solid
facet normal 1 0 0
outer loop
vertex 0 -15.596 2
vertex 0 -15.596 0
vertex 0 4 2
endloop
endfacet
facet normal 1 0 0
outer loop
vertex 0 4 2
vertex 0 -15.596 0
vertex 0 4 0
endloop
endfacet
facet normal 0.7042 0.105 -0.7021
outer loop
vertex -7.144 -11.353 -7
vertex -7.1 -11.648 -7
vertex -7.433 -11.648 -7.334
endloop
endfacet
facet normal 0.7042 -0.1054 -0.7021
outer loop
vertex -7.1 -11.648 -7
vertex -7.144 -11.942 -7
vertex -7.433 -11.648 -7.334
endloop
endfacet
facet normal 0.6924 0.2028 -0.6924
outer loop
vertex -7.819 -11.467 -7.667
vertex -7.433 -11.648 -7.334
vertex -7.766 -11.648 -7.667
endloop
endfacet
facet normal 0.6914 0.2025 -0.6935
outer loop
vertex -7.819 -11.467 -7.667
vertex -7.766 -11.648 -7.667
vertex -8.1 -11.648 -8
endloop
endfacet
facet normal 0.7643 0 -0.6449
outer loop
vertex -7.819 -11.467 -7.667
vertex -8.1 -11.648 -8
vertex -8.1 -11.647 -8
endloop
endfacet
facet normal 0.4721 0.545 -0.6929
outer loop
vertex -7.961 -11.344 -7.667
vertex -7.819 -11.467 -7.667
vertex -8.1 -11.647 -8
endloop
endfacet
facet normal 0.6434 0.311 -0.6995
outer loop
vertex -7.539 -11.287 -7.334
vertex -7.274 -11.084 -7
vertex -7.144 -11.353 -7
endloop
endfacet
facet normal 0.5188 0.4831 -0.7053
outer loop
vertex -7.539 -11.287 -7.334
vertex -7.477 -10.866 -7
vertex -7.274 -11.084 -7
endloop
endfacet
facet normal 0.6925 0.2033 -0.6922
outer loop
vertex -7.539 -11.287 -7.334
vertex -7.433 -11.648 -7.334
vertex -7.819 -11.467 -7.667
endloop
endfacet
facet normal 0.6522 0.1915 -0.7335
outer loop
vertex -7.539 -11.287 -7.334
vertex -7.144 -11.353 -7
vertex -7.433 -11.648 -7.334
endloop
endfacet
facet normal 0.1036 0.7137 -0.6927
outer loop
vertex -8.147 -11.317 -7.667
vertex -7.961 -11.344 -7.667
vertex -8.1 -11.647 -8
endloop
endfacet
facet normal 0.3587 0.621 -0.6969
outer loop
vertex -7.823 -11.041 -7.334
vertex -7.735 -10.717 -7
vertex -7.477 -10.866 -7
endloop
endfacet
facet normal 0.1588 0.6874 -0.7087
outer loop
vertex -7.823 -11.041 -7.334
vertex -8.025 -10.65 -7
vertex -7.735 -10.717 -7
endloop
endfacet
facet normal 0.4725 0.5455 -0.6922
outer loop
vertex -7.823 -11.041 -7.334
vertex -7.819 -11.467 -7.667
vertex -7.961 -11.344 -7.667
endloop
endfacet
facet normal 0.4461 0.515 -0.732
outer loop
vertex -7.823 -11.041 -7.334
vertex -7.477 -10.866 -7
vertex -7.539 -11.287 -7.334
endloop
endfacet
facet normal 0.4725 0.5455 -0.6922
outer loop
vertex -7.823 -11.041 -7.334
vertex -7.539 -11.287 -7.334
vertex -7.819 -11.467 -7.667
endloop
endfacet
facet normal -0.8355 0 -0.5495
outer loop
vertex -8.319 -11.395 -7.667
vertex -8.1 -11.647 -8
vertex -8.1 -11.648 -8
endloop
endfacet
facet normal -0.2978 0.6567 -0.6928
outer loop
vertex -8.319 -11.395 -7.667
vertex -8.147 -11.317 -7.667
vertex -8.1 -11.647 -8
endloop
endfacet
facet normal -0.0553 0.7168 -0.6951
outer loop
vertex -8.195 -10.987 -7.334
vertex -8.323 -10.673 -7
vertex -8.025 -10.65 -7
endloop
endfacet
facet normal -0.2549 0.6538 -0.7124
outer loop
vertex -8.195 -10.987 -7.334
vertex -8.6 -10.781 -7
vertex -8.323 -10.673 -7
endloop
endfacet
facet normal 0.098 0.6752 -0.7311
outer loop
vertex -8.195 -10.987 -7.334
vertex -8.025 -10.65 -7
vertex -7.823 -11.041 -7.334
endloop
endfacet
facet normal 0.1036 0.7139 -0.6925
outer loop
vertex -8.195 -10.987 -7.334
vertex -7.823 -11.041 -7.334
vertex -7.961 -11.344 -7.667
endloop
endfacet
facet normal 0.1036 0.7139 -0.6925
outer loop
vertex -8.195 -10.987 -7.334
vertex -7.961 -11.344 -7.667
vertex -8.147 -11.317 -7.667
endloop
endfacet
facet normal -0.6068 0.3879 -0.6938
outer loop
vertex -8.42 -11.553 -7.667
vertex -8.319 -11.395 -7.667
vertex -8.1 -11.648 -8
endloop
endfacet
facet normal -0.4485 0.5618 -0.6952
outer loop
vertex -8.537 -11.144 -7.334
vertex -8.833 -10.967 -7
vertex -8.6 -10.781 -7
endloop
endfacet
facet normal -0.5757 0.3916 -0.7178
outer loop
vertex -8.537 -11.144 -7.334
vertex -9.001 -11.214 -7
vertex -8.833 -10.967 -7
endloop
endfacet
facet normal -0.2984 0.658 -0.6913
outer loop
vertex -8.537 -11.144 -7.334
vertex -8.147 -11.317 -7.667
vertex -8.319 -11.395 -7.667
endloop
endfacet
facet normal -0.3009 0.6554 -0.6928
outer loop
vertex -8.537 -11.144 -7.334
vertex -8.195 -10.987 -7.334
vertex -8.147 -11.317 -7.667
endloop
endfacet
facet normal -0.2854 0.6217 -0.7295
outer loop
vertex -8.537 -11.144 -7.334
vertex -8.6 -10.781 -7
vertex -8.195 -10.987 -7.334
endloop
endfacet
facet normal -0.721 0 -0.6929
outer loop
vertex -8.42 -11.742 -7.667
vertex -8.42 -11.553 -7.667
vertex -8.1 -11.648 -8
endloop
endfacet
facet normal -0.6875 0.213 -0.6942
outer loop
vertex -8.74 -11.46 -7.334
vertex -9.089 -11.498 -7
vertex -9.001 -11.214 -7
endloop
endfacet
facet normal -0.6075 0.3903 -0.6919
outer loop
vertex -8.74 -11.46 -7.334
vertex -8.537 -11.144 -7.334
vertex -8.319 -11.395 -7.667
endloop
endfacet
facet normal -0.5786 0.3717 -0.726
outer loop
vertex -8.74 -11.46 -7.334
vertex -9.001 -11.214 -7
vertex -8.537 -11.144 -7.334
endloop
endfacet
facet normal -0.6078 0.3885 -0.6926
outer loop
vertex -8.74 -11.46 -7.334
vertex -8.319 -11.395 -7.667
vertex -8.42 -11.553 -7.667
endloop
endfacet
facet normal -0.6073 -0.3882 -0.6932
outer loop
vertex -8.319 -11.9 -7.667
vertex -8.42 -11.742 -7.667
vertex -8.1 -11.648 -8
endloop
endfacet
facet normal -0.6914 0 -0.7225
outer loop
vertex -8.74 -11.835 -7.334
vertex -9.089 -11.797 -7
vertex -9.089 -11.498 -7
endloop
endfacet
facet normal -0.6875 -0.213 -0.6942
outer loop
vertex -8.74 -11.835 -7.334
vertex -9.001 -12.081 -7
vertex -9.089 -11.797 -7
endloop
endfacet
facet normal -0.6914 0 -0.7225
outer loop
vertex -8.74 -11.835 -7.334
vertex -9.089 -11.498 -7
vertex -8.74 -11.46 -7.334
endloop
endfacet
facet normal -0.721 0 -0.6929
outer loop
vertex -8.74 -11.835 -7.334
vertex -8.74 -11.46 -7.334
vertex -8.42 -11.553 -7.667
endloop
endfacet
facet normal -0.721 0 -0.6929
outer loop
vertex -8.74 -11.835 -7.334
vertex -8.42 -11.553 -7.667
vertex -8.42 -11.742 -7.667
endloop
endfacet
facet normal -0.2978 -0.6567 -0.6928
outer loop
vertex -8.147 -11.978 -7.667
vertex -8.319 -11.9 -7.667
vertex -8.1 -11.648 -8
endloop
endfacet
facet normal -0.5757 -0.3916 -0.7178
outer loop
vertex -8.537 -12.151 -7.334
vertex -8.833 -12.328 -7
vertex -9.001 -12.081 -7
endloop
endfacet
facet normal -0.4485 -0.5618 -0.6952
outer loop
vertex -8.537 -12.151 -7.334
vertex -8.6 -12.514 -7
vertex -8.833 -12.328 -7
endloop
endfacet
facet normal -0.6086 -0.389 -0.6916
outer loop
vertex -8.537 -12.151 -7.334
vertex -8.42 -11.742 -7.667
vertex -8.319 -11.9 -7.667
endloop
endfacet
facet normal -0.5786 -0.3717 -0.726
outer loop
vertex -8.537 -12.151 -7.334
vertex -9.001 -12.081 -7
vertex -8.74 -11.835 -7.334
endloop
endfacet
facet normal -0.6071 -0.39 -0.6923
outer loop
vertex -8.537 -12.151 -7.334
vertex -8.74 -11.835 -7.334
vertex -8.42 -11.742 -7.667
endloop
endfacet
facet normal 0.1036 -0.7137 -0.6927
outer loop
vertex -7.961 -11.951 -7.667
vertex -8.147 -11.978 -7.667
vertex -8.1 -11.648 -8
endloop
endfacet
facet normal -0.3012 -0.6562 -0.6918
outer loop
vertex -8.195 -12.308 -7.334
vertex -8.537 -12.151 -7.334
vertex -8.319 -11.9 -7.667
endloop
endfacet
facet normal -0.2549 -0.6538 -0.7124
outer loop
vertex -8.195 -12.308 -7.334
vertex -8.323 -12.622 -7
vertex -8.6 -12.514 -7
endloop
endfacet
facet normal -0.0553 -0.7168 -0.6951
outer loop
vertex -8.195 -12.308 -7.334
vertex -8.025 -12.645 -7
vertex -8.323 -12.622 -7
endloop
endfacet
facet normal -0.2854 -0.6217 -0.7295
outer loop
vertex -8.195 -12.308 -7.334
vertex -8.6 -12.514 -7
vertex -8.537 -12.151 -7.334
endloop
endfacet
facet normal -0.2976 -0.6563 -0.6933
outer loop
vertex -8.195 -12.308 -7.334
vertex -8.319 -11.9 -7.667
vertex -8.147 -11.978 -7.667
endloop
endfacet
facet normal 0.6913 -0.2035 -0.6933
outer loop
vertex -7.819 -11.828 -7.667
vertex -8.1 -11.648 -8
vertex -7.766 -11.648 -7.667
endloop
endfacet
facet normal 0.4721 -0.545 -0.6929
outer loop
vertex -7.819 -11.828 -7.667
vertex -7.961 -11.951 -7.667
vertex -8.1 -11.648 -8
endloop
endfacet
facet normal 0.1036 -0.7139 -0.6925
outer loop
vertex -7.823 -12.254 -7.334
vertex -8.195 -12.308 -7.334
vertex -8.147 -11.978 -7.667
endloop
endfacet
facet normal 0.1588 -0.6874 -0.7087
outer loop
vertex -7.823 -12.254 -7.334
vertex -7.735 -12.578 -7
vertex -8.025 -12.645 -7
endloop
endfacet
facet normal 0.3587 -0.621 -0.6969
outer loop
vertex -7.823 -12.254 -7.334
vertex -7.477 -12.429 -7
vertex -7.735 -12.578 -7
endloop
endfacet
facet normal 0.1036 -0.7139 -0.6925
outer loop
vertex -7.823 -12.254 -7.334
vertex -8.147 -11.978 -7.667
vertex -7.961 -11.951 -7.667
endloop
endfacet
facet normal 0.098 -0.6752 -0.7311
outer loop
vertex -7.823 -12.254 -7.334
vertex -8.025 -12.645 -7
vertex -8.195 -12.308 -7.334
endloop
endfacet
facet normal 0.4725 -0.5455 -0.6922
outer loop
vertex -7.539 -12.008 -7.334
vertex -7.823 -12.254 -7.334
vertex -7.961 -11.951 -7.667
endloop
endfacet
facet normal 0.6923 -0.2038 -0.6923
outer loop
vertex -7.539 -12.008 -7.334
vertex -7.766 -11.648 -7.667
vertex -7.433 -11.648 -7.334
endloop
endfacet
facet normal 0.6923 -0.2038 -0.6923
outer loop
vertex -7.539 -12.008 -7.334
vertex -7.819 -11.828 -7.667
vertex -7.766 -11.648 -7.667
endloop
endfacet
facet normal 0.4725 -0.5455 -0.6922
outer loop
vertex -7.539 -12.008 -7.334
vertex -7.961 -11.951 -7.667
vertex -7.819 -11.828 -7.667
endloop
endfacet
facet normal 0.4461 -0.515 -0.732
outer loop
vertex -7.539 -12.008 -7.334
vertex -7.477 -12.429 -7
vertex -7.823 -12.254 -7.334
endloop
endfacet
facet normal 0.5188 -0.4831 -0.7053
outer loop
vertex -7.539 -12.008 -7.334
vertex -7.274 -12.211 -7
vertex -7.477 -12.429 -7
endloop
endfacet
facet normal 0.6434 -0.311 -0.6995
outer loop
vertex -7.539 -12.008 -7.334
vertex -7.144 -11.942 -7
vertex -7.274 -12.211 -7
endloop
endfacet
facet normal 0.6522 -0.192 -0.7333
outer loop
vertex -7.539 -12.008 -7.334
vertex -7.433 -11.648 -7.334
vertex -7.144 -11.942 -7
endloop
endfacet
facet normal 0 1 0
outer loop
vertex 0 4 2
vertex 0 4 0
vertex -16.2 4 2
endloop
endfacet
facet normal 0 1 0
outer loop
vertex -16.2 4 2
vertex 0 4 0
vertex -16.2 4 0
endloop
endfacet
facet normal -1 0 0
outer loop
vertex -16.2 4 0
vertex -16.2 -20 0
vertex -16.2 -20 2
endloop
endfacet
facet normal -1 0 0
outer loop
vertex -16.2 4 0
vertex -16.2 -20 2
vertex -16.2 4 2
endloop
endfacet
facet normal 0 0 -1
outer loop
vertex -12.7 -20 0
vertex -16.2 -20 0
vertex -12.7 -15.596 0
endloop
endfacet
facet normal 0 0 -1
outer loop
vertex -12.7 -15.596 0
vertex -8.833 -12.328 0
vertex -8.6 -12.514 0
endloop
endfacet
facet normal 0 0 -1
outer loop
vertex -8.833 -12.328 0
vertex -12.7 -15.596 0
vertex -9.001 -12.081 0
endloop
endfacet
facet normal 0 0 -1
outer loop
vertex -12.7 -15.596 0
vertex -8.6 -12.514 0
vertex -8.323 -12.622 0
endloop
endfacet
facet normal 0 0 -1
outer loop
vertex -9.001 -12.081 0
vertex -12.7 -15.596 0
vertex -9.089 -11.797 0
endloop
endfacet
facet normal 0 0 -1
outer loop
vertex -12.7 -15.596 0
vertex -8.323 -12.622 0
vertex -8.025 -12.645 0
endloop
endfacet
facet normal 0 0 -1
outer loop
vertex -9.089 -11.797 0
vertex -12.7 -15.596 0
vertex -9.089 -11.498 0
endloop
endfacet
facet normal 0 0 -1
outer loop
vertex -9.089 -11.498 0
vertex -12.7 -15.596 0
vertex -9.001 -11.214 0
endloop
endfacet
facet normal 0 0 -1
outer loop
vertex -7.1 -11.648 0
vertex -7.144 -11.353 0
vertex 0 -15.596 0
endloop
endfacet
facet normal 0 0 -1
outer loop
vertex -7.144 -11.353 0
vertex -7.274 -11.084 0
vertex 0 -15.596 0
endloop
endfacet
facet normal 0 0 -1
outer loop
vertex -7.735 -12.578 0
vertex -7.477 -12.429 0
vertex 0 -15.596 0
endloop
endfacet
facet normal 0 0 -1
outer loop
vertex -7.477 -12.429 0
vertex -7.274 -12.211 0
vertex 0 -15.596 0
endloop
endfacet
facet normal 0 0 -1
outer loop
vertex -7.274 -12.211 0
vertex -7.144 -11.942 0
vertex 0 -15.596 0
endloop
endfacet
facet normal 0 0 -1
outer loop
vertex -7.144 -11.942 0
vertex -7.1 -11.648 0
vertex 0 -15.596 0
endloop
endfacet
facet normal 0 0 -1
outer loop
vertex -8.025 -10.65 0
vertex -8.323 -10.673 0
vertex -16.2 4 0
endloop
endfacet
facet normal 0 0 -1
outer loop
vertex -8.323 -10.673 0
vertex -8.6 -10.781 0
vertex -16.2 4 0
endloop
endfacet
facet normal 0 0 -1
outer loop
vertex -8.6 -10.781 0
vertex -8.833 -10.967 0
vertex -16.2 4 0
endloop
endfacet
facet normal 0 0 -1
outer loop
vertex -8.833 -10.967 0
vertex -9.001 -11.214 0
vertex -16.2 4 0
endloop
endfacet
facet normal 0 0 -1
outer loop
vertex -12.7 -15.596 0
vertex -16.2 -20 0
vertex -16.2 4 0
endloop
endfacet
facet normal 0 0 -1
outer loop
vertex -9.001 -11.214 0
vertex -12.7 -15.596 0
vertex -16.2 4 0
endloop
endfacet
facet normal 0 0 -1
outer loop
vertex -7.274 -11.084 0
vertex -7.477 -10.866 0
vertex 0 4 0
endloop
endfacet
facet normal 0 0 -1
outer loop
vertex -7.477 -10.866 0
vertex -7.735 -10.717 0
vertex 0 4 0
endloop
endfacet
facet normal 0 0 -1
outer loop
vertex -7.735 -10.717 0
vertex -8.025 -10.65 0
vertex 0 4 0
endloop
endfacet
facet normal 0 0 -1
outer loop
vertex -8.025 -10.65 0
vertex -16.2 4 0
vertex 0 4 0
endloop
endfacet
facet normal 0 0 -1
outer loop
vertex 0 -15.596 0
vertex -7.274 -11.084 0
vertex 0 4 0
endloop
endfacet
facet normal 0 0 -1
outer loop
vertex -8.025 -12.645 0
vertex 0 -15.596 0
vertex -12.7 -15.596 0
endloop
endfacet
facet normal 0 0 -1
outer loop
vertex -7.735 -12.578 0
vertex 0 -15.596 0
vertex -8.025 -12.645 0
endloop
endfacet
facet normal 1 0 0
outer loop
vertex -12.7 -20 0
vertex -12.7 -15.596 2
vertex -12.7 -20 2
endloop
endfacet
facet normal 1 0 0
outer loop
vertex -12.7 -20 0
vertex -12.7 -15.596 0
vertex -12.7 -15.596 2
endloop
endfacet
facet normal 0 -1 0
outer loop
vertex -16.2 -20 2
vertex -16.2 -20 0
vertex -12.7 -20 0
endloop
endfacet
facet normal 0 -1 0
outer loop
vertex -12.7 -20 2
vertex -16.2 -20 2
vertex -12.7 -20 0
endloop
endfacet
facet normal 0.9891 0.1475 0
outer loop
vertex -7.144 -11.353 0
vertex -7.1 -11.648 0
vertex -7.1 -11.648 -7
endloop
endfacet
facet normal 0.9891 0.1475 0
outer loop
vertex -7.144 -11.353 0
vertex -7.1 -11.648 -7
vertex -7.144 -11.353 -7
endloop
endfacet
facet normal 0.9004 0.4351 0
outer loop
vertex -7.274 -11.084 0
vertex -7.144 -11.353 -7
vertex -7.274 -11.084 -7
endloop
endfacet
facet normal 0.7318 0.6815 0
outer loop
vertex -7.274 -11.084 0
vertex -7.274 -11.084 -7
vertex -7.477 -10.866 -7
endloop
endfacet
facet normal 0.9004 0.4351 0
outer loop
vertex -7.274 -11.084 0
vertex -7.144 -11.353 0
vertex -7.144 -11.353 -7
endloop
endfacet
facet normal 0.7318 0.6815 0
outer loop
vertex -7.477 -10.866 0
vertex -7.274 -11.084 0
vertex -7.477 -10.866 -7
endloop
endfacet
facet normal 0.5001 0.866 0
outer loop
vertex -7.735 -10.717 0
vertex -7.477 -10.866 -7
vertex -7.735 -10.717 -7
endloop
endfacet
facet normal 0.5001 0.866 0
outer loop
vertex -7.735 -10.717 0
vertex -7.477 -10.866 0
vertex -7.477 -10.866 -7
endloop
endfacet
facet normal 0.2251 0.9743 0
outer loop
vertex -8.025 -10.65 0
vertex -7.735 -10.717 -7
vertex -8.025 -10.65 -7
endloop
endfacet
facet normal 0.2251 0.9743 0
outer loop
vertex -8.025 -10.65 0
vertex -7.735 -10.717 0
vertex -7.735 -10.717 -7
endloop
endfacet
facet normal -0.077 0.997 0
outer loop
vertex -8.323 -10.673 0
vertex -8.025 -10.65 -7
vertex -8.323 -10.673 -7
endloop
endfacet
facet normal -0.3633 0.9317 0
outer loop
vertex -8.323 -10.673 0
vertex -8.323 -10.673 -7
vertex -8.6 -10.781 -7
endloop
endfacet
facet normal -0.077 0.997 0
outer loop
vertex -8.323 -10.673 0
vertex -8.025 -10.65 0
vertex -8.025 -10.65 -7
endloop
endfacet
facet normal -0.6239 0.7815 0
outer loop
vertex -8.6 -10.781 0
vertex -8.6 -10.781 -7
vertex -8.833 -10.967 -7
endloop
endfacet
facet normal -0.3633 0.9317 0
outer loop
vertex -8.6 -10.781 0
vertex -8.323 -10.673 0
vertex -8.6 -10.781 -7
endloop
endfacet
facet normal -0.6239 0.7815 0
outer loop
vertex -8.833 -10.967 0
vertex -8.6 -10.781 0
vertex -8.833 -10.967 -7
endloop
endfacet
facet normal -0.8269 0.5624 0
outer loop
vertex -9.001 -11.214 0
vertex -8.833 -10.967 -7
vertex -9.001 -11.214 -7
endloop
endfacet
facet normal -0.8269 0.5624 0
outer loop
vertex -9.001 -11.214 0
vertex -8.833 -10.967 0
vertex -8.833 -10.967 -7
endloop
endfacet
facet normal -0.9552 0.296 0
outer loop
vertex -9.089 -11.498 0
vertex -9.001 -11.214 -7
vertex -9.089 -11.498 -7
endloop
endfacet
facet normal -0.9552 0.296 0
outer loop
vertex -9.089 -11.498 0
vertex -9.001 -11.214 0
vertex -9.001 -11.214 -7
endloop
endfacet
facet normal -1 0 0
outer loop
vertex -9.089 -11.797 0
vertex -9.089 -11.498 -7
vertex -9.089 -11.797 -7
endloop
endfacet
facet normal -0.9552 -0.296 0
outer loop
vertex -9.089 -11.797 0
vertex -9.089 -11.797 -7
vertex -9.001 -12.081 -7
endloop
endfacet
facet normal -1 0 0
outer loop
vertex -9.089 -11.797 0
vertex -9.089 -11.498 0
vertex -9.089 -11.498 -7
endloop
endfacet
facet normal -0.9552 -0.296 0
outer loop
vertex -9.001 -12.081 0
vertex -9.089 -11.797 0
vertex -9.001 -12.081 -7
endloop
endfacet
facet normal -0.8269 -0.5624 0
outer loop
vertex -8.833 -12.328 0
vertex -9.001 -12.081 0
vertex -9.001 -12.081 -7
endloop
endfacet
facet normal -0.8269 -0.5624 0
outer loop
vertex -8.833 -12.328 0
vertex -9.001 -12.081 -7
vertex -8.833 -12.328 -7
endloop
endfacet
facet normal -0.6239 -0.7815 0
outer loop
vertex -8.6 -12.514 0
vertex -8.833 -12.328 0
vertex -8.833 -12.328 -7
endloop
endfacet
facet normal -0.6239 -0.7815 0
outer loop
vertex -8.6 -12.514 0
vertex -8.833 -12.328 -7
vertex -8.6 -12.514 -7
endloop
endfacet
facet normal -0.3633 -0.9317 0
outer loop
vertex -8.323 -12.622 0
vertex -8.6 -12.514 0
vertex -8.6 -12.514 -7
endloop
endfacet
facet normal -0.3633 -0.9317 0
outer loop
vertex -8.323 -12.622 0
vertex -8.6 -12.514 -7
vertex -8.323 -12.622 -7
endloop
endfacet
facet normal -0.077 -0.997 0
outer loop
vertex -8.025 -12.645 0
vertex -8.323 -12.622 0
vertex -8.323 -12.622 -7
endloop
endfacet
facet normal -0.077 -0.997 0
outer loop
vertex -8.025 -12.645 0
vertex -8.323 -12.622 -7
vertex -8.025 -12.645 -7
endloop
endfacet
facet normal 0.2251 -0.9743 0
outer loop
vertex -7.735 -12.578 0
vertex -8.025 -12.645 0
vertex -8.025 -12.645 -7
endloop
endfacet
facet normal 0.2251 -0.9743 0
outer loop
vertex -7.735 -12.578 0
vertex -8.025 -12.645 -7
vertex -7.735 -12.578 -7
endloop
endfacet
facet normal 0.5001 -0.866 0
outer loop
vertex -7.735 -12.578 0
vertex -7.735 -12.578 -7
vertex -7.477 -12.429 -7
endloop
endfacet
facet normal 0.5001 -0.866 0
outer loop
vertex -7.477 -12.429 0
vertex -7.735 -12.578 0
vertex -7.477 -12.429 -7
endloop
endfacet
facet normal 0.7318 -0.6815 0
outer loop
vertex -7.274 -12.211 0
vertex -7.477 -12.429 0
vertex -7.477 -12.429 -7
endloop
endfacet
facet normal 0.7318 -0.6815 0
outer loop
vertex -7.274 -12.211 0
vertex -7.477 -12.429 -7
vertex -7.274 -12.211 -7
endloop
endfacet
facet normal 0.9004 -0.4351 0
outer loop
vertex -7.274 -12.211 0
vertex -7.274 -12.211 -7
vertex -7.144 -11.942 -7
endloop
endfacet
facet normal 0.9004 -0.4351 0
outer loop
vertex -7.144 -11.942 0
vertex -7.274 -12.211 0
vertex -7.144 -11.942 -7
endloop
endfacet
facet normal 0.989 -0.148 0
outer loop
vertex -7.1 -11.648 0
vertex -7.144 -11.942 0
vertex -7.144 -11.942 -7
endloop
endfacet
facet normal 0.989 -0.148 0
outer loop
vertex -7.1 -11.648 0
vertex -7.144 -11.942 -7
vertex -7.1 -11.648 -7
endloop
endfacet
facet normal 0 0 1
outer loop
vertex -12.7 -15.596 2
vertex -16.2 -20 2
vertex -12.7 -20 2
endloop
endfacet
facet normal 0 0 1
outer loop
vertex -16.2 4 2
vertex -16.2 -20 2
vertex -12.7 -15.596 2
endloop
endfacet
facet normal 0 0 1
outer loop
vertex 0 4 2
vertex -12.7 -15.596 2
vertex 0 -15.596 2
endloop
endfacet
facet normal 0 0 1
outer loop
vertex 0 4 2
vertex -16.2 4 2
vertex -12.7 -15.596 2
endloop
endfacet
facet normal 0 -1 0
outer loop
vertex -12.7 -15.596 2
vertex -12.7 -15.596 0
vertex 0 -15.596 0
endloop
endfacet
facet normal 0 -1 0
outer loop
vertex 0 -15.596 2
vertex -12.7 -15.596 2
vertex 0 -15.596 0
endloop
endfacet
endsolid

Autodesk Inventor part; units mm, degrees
ref_plane "YZ Plane" through (0, 0, 0) normal (1, 0, 0) x (0, 1, 0)
ref_plane "XZ Plane" through (0, 0, 0) normal (0, 1, 0) x (-1, 0, 0)
ref_plane "XY Plane" through (0, 0, 0) normal (0, 0, 1) x (1, 0, 0)
sketch "Sketch1" plane through (0, 0, 0) normal (0, 0, 1) x (1, 0, 0)
  line L0 (-3.5, 0) -> (-3.5, -20) projected
  line L1 (-3.5, -20) -> (0, -20) projected
  line L2 (-16.2, -20) -> (-16.2, 4) projected
  line L3 (-16.2, -20) -> (-12.7, -20) projected
  line L4 (-12.7, 0) -> (-12.7, -20) projected
  line L5 (0, 4) -> (-16.2, 4)
  line L6 (-16.2, 4) -> (-16.2, -15.5962)
  line L7 (-16.2, -15.5962) -> (0, -15.5962)
  line L8 (0, -15.5962) -> (0, 4)
  line L9 (0, -20) -> (0, 4) projected
  line L10 (-16.2, 4) -> (0, 4) projected
  line L11 (-12.7, 0) -> (-3.5, 0) projected
  point P0 (0, 0)
  point P1 (-12.7, -15.5962)
  point P2 (-3.5, -15.5962)
extrude "Extrusion1" add sketch "Sketch1" along normal blind 2 contours L11 L4 L7 L2 L5 L8 L0 | L0 L7 L4 L11 | L4 L3 L2 L7
sketch "Sketch2" plane through (0, 0, 2) normal (0, 0, 1) x (1, 0, 0)
  line L0 (0, -15.5962) -> (0, 4) projected
  line L1 (0, 4) -> (-16.2, 4) projected
  line L2 (-16.2, 4) -> (-16.2, -20) projected
  line L3 (-12.7, -15.5962) -> (0, -15.5962) projected
  circle A0 centre (-8.1, -11.6475) radius 1
  line L4 (-12.7, -20) -> (-12.7, -15.5962) projected
  line L5 (-16.2, -20) -> (-12.7, -20) projected
  point P0 (0, 0)
  dimension "d2" = 2
extrude "Extrusion2" add sketch "Sketch2" against normal blind 10 contours A0
chamfer "Chamfer1" distance 1 angle 45 1 edges at (-9.1, -11.6475, -8)
pattern_linear "Rectangular Pattern1" [suppressed]
properties part number "30_XY_Sample_lightsheetarm_sample_lid"
